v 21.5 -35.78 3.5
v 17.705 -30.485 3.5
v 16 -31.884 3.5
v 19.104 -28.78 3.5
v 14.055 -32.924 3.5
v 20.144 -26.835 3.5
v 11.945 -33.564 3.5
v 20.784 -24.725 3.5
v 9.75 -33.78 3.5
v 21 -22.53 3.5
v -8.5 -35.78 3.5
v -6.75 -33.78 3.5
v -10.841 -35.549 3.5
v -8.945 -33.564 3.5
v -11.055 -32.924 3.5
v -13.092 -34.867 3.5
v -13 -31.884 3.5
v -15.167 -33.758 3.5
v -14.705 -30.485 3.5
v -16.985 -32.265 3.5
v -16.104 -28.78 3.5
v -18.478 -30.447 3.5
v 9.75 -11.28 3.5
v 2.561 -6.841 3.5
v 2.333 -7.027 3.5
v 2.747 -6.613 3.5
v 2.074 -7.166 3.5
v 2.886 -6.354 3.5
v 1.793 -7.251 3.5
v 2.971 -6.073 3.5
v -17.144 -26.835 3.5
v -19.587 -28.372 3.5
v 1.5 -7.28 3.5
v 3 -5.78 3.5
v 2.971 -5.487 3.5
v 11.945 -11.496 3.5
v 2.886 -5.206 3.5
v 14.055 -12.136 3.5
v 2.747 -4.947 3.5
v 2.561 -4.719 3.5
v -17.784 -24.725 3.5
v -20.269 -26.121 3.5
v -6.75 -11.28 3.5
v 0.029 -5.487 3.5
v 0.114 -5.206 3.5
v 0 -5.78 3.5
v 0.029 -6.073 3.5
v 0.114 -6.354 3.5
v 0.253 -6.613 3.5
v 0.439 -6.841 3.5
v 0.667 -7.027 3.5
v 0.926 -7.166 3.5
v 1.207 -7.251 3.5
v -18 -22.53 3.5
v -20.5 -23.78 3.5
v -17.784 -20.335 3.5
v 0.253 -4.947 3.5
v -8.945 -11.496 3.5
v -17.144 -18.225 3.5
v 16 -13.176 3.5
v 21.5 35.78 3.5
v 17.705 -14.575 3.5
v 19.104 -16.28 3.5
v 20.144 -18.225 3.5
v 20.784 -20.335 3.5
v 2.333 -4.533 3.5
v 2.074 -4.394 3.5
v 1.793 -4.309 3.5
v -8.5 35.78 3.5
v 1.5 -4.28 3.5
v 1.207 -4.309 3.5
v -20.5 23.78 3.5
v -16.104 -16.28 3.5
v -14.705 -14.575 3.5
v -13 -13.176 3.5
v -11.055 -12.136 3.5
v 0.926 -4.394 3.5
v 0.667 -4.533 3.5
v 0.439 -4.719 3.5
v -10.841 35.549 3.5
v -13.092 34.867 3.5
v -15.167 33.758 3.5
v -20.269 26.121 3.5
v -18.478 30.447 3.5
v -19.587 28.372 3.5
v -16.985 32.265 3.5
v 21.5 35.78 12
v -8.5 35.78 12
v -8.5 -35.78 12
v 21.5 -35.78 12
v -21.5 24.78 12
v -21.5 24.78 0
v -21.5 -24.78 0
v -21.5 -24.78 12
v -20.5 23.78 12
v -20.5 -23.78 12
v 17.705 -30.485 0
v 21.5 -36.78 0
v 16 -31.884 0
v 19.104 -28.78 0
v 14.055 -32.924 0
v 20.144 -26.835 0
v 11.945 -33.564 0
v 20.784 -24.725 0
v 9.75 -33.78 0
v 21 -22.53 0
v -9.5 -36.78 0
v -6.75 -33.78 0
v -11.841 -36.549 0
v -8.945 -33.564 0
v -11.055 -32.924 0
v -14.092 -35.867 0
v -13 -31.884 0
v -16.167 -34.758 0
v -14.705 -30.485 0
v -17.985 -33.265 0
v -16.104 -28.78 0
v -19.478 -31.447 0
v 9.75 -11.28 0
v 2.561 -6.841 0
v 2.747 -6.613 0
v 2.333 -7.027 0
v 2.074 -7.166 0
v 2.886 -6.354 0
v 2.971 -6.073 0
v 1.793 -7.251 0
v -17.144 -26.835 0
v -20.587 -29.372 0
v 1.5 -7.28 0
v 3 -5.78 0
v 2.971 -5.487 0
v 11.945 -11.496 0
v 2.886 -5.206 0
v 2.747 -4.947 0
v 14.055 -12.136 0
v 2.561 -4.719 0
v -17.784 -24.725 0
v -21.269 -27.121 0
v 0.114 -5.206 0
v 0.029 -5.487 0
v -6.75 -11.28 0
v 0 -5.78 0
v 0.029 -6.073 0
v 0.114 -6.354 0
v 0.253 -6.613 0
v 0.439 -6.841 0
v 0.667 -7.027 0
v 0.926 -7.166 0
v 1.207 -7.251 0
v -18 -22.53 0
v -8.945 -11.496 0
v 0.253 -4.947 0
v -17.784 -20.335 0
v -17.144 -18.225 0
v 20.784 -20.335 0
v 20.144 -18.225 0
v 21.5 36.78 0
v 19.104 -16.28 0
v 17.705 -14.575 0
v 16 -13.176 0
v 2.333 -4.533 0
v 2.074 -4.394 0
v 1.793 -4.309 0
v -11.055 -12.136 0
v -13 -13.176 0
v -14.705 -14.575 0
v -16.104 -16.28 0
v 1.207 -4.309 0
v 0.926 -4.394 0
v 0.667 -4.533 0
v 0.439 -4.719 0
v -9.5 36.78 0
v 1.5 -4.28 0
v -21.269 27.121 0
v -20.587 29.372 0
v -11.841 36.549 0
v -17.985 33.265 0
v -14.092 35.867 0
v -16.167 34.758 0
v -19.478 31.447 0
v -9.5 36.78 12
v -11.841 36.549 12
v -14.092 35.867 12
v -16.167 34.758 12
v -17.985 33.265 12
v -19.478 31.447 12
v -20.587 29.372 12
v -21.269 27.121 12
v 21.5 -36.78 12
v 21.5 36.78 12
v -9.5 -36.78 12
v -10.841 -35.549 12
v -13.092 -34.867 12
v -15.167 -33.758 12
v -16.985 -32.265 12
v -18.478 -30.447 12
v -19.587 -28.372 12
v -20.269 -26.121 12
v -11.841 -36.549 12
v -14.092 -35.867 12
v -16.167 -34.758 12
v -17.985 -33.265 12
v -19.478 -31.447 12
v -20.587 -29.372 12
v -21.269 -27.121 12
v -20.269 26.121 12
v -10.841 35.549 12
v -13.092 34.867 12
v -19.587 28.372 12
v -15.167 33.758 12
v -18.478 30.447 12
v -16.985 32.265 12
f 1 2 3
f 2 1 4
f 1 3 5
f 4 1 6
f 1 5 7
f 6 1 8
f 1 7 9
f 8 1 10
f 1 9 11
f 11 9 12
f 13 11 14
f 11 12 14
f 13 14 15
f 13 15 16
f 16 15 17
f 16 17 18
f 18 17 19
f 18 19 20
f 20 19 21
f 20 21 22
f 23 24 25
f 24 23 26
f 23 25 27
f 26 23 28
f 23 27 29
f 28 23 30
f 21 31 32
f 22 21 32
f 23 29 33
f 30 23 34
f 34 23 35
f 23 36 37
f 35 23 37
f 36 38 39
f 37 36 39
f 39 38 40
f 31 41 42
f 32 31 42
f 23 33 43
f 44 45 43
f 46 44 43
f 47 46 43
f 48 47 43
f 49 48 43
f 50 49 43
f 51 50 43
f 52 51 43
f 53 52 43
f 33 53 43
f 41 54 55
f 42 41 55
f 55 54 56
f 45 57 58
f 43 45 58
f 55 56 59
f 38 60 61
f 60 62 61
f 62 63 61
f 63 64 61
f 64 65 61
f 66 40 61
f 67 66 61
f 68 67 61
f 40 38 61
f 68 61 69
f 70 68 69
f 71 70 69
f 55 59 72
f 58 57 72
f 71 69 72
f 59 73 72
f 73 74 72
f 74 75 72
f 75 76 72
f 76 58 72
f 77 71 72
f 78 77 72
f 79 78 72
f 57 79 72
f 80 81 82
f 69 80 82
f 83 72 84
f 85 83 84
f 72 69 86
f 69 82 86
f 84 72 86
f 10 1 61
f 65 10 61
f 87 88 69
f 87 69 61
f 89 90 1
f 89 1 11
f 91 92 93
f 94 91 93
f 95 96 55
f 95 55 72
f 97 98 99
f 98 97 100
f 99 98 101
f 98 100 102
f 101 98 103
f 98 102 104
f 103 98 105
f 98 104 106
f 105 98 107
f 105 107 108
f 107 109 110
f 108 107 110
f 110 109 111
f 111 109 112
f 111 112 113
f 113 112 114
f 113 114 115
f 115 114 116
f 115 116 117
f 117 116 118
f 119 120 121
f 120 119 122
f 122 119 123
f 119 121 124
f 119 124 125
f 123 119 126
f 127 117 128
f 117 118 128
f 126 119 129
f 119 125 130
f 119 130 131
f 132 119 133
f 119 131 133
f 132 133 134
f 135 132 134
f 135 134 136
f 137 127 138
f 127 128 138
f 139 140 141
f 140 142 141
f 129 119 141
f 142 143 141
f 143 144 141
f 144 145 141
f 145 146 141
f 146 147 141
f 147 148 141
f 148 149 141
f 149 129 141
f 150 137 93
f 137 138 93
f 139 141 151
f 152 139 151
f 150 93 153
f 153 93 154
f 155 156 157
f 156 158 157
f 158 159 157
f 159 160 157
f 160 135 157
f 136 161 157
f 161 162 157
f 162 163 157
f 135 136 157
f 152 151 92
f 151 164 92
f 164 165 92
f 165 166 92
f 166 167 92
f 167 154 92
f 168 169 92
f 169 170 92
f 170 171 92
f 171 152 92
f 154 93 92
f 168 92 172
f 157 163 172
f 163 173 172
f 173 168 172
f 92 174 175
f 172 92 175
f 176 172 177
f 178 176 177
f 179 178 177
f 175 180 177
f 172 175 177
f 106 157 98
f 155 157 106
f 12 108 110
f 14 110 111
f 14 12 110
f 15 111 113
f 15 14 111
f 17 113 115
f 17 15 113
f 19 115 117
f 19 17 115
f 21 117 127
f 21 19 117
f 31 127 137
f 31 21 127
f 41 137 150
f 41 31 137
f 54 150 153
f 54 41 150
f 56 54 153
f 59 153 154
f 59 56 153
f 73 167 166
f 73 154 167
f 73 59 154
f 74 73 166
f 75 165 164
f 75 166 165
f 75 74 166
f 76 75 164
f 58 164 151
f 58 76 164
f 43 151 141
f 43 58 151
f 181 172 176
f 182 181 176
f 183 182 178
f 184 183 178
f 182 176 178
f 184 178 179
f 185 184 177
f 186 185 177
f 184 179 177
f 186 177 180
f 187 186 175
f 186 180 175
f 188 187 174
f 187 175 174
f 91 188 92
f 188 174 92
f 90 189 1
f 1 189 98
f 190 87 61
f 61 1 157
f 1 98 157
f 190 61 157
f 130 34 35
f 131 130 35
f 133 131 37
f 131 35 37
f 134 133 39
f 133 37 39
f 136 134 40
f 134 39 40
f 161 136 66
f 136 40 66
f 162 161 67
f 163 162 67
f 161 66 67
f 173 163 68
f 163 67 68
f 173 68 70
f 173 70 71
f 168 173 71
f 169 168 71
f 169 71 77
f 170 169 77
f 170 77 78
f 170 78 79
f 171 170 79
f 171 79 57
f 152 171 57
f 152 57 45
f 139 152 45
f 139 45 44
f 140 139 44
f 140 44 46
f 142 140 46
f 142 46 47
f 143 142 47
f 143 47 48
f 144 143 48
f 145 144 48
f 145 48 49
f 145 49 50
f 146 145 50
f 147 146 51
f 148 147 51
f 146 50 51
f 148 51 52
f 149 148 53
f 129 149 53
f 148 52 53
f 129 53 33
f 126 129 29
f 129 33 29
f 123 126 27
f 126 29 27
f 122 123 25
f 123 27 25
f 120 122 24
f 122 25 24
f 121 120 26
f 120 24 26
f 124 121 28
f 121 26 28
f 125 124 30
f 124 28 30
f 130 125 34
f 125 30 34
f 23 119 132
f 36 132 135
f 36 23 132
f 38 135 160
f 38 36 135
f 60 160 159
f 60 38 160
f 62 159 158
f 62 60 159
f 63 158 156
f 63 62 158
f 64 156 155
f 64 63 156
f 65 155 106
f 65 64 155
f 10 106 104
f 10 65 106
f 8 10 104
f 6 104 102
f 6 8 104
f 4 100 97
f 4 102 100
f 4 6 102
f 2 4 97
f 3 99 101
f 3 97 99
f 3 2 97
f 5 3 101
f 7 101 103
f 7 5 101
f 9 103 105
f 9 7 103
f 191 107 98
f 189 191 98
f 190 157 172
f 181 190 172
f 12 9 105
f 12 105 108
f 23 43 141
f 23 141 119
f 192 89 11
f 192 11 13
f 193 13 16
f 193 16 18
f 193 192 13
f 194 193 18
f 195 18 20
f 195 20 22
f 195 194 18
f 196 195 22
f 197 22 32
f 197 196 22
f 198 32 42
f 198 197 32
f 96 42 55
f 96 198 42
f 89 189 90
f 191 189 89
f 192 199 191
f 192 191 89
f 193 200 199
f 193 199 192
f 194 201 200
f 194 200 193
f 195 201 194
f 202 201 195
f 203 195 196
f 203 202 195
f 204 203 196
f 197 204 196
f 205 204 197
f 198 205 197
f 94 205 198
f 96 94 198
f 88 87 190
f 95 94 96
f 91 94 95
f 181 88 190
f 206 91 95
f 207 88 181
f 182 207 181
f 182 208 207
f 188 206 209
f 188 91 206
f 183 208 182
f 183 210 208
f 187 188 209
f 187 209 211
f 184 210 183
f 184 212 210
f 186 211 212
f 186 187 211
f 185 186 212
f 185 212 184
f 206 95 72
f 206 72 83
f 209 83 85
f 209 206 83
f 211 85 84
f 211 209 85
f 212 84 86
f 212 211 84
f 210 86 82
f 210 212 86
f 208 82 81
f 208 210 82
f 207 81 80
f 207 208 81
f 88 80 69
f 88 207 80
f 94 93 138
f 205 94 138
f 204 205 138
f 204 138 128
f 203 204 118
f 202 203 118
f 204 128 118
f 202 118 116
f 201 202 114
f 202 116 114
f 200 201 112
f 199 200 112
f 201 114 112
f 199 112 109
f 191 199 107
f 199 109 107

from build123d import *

# Parameters (mm, degrees)
BOSS_EXTRUDE2_DEPTH = 12
CUT_EXTRUDE1_DEPTH  = 8.5
SKETCH6_R           = 1.5
CUT_EXTRUDE2_DEPTH  = 8.5


with BuildPart() as part:
    # Sketch2 → Boss-Extrude2 (new body)
    with BuildSketch(Plane(origin=(0, 0, 0), x_dir=(0, 1, 0), z_dir=(0, 0, 1))):
        with BuildLine():
            Line((-36.78, -21.5), (36.78, -21.5))
            Line((36.78, -21.5), (36.78, 9.5))
            ThreePointArc((36.78, 9.5), (33.265281374, 17.985281374), (24.78, 21.5))
            Line((24.78, 21.5), (-24.78, 21.5))
            ThreePointArc((-24.78, 21.5), (-33.265281374, 17.985281374), (-36.78, 9.5))
            Line((-36.78, 9.5), (-36.78, -21.5))
        make_face()
    extrude(amount=BOSS_EXTRUDE2_DEPTH)

    # Sketch5 → Cut-Extrude1 (cut)
    with BuildSketch(Plane.XY.offset(12)):
        with BuildLine():
            Line((21.5, -35.78), (-8.5, -35.78))
            ThreePointArc((-8.5, -35.78), (-16.985281374, -32.265281374), (-20.5, -23.78))
            Line((-20.5, -23.78), (-20.5, 23.78))
            ThreePointArc((-20.5, 23.78), (-16.985281374, 32.265281374), (-8.5, 35.78))
            Line((-8.5, 35.78), (21.5, 35.78))
            Line((21.5, 35.78), (21.5, -35.78))
        make_face()
    extrude(amount=-CUT_EXTRUDE1_DEPTH, mode=Mode.SUBTRACT)

    # Sketch6 → Cut-Extrude2 (cut)
    with BuildSketch(Plane.XY.offset(3.5)):
        with Locations((1.5, -5.78)):
            Circle(SKETCH6_R)
        with BuildLine():
            Line((9.75, -33.78), (-6.75, -33.78))
            ThreePointArc((-6.75, -33.78), (-18, -22.53), (-6.75, -11.28))
            Line((-6.75, -11.28), (9.75, -11.28))
            ThreePointArc((9.75, -11.28), (21, -22.53), (9.75, -33.78))
        make_face()
    extrude(amount=-CUT_EXTRUDE2_DEPTH, mode=Mode.SUBTRACT)


solid = part.part
